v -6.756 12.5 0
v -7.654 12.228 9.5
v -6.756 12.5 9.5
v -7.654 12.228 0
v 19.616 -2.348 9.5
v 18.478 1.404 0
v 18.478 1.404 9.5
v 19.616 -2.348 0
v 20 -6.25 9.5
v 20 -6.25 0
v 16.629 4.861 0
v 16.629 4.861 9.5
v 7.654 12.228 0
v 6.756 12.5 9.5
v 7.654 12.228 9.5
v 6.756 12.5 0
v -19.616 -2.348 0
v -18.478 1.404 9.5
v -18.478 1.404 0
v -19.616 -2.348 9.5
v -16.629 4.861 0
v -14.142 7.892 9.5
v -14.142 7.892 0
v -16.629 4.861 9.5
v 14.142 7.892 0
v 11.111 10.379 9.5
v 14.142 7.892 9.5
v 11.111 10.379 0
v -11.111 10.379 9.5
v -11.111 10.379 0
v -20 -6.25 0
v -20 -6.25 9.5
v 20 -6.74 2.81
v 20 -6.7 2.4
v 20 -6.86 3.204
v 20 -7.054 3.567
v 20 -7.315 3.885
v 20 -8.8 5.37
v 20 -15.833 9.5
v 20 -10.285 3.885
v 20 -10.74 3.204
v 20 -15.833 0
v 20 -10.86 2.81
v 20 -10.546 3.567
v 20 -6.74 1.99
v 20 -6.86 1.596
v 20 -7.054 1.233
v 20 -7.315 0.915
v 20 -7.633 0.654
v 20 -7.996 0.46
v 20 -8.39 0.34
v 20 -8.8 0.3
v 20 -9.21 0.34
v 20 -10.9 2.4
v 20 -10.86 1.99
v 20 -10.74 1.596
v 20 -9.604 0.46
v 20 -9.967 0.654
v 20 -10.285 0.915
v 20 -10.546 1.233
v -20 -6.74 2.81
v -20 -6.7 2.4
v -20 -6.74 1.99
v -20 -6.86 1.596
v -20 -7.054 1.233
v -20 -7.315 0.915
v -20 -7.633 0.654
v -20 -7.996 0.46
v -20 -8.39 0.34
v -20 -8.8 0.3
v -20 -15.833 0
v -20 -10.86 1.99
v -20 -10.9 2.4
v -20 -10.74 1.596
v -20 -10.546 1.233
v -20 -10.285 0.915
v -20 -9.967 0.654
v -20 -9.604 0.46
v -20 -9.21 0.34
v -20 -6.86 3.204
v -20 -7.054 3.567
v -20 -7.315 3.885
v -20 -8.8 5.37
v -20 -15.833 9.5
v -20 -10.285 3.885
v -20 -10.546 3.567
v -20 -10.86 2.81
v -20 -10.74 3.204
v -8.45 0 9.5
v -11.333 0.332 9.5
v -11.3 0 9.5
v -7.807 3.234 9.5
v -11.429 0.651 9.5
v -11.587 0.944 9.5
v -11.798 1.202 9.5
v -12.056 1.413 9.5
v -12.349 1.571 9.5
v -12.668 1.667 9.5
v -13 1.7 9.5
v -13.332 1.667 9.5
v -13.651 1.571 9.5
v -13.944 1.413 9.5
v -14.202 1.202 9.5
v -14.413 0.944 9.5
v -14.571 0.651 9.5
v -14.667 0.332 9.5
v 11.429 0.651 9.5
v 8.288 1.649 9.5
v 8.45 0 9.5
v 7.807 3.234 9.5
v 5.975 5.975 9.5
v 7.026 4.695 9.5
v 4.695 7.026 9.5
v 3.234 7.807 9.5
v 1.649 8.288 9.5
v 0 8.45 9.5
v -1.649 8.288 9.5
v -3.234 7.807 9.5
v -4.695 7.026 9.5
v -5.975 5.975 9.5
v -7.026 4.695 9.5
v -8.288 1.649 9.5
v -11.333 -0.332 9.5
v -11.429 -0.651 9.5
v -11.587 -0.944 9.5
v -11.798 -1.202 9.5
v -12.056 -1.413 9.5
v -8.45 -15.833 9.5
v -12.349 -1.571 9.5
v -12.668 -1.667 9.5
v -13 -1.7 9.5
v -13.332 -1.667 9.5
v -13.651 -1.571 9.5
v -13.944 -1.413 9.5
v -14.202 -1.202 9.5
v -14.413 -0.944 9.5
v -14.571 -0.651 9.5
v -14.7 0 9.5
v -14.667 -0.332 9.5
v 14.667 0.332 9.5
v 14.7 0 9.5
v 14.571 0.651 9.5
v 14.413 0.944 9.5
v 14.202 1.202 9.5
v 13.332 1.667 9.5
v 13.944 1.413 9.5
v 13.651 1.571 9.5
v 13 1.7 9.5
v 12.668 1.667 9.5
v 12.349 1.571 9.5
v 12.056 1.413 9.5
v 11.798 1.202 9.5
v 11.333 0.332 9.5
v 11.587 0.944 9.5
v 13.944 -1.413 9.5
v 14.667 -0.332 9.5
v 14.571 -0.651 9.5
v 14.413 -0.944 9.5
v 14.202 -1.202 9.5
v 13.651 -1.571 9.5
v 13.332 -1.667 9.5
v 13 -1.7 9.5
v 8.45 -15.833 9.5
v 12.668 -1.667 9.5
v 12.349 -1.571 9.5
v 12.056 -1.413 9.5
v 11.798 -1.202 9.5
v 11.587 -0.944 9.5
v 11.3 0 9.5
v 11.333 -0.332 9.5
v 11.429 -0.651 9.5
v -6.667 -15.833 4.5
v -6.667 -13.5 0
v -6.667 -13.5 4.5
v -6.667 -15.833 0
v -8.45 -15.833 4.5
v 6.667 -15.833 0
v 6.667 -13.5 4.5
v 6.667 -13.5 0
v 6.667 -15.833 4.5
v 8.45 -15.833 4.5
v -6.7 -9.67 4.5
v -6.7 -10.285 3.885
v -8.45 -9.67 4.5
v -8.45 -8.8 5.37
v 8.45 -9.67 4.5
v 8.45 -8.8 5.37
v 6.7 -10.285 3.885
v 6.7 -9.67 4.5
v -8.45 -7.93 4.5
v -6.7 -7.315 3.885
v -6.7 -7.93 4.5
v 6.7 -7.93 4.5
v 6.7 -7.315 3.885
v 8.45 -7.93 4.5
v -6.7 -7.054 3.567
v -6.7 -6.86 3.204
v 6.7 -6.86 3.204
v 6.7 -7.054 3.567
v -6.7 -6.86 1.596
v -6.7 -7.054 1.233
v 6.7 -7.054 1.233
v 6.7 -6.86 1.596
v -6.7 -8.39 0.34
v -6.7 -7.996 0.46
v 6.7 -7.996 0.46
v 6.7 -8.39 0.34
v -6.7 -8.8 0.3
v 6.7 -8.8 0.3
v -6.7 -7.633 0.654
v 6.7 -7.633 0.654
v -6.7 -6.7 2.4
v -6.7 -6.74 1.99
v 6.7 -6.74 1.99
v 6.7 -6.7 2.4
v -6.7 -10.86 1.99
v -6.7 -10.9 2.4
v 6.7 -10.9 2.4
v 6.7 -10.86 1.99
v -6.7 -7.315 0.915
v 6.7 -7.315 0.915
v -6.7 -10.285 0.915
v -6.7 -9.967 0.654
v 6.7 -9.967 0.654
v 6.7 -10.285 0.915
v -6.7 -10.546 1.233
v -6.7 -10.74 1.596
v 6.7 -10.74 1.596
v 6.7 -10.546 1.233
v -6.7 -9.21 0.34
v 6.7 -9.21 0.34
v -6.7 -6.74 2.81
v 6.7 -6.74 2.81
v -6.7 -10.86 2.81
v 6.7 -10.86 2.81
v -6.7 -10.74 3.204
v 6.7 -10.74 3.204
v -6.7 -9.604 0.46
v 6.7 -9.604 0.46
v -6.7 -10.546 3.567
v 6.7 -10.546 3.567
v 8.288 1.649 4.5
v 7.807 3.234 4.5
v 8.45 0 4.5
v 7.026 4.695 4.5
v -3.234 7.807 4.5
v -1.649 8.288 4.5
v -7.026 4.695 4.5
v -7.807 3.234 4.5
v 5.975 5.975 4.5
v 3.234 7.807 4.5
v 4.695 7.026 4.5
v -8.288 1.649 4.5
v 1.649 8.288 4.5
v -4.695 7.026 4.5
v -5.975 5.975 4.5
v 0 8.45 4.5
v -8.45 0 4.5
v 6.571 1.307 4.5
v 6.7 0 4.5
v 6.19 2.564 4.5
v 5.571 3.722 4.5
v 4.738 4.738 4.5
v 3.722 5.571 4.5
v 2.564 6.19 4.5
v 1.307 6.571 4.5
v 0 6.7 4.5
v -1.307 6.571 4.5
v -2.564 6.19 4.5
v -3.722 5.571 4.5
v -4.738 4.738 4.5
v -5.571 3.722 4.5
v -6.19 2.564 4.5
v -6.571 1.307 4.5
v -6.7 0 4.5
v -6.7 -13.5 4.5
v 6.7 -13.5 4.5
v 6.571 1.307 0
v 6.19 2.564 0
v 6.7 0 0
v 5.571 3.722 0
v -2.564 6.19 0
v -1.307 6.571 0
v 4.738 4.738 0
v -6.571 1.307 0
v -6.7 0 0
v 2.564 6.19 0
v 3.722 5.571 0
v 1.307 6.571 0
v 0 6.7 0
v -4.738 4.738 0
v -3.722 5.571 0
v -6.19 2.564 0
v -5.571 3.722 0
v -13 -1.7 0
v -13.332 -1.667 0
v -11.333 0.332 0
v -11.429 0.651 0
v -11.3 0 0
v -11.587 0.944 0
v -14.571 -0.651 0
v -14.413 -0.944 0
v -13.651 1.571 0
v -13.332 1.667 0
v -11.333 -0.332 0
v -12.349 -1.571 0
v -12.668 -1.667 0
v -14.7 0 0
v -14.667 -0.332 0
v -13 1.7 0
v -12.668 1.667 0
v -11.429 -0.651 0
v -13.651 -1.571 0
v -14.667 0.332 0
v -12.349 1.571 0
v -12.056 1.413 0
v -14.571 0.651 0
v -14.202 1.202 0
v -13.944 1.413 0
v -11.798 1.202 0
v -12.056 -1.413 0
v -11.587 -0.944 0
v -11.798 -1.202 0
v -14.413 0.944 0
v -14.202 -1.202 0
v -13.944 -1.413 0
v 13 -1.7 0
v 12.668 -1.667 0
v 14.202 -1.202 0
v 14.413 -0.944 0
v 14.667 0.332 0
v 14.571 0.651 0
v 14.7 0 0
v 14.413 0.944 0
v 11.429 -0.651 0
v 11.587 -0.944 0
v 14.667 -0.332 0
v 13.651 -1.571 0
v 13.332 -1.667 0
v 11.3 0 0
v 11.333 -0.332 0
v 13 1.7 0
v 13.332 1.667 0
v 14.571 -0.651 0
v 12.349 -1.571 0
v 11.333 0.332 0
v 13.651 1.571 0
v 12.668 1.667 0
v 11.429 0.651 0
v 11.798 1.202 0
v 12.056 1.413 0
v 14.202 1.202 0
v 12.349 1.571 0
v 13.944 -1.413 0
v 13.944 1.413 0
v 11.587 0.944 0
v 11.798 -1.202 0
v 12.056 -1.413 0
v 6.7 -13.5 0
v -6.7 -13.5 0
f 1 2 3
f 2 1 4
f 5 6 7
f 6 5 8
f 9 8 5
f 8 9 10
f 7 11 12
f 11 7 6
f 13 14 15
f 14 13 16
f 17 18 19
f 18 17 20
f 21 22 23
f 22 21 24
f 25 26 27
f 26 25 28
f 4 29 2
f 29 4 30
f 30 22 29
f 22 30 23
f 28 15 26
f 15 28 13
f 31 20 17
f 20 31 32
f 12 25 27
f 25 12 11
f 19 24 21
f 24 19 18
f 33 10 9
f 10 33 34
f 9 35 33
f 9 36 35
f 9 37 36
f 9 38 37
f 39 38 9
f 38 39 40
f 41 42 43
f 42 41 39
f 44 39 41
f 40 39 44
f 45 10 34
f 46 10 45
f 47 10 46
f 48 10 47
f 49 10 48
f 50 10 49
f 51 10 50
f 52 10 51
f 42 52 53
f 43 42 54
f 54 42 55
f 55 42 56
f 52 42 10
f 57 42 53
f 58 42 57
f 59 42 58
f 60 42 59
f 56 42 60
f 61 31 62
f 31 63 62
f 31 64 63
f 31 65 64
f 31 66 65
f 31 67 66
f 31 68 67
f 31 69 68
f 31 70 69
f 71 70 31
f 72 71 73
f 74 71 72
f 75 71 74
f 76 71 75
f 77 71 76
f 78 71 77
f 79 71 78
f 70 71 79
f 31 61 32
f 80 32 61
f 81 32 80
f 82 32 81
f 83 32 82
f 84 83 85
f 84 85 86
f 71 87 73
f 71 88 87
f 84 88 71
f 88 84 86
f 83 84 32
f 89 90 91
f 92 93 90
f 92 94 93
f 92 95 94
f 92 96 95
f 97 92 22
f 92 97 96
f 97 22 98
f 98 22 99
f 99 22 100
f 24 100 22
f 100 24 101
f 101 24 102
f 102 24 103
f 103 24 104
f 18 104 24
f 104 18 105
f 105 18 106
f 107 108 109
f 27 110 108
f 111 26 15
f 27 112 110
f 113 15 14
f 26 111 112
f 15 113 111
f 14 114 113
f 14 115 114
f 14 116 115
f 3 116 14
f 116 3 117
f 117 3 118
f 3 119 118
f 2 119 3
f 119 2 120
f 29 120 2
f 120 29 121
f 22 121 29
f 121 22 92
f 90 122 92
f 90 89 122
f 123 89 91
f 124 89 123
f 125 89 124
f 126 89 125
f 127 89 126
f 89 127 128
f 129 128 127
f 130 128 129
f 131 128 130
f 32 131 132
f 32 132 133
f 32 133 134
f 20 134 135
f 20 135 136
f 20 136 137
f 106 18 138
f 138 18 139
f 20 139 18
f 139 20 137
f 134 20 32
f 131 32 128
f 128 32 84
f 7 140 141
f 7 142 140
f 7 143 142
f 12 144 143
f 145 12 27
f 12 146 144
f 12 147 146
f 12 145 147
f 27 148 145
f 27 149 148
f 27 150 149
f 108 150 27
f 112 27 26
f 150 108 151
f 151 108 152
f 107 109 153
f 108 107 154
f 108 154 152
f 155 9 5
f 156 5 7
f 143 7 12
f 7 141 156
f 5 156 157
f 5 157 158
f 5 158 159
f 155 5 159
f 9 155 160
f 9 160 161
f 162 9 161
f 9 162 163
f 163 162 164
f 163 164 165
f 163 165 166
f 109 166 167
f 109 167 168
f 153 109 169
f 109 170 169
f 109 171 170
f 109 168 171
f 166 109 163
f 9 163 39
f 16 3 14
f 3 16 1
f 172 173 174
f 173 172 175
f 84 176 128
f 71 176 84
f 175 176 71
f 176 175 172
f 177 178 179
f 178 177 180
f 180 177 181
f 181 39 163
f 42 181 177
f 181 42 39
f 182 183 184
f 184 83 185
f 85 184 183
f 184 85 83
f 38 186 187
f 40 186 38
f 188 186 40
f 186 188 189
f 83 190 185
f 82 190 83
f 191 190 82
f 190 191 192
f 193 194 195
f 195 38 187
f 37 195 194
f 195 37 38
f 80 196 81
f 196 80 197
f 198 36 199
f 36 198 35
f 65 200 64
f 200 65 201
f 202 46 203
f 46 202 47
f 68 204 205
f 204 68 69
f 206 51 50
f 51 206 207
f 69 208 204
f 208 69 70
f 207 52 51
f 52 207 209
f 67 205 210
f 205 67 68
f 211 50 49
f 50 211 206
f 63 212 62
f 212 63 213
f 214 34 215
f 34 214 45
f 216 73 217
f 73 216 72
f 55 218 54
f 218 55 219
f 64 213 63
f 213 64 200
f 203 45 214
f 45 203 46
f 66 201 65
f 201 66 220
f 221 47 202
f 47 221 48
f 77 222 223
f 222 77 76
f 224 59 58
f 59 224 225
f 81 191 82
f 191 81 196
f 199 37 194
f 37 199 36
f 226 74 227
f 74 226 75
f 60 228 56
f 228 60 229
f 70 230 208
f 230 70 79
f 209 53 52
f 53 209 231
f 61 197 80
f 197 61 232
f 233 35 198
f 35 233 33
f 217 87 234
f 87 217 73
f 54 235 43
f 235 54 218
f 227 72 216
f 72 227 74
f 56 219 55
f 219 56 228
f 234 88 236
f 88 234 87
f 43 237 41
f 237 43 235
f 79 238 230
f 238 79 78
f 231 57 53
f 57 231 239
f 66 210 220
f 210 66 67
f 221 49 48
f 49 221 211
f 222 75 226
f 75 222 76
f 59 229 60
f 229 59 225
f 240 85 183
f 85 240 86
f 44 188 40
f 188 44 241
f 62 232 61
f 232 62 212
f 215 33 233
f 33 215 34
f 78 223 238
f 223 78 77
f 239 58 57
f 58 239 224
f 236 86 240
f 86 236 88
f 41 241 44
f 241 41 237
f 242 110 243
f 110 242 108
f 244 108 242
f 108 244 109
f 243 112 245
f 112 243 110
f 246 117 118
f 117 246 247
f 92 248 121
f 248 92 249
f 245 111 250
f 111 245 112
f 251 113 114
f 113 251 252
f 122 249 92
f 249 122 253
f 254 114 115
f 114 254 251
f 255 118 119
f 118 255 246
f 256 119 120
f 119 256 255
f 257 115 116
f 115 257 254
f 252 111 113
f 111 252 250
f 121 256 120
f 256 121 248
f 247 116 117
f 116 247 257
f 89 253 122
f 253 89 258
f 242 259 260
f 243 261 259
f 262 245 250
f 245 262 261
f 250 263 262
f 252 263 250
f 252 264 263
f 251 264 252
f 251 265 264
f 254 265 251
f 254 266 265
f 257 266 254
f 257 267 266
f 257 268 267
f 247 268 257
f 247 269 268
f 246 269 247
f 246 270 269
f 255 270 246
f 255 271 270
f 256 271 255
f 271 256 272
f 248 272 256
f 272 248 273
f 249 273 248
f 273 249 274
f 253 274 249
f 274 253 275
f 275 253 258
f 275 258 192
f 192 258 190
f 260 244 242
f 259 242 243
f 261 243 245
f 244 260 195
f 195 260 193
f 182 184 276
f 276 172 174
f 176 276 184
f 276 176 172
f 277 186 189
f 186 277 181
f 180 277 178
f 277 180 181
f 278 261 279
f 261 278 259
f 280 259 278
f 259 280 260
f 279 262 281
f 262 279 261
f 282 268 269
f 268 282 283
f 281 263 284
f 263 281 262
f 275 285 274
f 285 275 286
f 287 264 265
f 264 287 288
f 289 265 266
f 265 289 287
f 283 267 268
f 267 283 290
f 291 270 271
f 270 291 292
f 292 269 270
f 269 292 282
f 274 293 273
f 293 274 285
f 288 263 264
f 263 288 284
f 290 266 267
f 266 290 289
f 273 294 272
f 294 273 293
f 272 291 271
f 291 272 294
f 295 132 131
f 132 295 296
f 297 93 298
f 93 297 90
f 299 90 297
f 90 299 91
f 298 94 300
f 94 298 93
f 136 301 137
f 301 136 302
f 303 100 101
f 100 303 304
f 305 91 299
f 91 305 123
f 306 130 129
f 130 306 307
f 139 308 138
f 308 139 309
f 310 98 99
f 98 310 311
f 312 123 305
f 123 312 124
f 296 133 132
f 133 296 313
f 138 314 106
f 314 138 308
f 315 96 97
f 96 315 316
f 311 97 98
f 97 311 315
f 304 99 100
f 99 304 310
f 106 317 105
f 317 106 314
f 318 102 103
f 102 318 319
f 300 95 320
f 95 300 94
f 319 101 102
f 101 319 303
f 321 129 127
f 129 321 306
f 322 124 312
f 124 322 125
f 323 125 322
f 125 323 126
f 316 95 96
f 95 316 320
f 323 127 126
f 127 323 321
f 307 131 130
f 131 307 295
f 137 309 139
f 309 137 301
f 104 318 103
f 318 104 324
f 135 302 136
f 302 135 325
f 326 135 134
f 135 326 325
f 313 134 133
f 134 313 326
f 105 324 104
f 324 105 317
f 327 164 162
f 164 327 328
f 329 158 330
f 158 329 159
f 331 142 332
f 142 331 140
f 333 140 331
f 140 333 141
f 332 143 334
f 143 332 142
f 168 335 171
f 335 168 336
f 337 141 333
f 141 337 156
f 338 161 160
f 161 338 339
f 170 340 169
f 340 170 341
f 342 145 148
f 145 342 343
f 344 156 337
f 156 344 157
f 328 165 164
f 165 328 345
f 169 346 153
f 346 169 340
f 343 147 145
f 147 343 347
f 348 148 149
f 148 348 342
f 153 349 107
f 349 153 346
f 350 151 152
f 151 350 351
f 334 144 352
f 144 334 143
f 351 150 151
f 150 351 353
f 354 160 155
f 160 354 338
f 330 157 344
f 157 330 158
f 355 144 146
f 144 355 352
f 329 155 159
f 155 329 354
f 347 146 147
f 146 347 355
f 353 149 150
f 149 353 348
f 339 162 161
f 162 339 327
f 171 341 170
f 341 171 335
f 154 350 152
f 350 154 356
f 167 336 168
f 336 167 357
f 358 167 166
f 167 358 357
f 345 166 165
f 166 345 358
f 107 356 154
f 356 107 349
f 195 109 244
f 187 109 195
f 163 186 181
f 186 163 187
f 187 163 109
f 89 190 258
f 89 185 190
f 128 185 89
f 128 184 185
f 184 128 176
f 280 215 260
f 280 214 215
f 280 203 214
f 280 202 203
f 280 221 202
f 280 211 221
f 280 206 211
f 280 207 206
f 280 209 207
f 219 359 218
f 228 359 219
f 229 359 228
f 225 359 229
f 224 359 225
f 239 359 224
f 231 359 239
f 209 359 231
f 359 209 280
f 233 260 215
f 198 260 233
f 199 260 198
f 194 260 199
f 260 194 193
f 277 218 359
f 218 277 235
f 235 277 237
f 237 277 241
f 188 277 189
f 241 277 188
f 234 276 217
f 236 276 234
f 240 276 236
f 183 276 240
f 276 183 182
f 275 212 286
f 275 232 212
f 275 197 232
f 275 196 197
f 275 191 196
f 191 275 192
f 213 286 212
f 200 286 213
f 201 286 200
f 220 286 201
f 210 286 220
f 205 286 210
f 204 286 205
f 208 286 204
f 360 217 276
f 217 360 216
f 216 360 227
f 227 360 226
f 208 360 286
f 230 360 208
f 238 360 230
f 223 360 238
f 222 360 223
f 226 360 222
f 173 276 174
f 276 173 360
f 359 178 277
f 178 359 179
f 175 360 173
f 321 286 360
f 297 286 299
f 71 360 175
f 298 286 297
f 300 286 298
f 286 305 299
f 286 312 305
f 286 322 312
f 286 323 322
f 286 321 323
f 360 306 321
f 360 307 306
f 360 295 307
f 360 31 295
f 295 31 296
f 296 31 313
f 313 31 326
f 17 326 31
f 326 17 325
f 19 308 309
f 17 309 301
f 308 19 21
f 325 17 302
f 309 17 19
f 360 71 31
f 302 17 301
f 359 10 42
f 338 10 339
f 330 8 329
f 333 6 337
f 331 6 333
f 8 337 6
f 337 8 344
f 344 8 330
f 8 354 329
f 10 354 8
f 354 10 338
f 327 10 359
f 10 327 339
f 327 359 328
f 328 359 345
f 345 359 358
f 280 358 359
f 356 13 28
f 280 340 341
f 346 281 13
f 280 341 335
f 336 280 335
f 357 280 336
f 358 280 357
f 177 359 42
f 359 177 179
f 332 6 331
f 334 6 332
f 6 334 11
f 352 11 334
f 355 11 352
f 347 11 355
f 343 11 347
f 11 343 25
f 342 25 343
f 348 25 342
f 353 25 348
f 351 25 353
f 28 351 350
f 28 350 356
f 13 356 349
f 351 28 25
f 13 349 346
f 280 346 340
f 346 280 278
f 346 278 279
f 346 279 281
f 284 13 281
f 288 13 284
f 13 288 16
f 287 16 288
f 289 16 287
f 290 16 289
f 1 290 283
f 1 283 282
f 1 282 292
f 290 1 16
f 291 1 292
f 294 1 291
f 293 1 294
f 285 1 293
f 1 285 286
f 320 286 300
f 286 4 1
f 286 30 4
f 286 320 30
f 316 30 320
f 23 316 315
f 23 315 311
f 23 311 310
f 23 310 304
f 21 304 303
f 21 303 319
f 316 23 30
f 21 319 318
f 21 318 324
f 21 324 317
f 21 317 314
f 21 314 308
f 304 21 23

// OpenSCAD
// Grooved Insulator Mount Adapter #3
// by Tony Buser <tbuser@gmail.com>
// uses teardrop module by Erik de Bruijn <info@erikdebruijn.nl>
// GPLv2 or later

// actually about 16, set slightly larger if printer isn't perfect
barrel_diameter = 16.9;

// actually about 13, set slightly larger if printer isn't perfect
barrel_inset_diameter = 13.4;

// how long?
plate_length = 40;

// how wide?
plate_width = 25;

// probably don't want to change this
plate_height = 10;

// mounting bolts will need to be 15mm long?
mounting_bolt_diameter = 3.4;

// for standard plastruder = 13 for printruder II = 14
left_mounting_bolt_distance = 13;

// for standard plastruder = 13 for printruder II = 11
right_mounting_bolt_distance = 13;

// single horizontal bolt to clamp and hold insulator in place. will need to be around 45mm long?
clamp_bolt_diameter = 4.2;

$fn = 32;

module teardrop(radius,height,truncated) {
	truncateMM = 1;
	union() {
		if (truncated == true) {
			intersection() {
				translate([0,0,height/2]) scale([1,1,height]) rotate([0,0,180]) cube([radius*2.5,radius*2,1],center=true);
				scale([1,1,height]) rotate([0,0,3*45]) cube([radius,radius,1]);
			}
		}
		if (truncated == false) {
			scale([1,1,height]) rotate([0,0,3*45]) cube([radius,radius,1]);
		}
		cylinder(r=radius, h = height);
	}
}

module plate() {
	difference() {
		union() {
			cube([plate_length, plate_width, plate_height]);

			// mounting bolt reinforcement
			translate([0, -plate_width/3+5, 0]) {
				cube([plate_length/3, plate_width/3-5, plate_height]);
			}

			translate([plate_length-plate_length/3, -plate_width/3+5, 0]) {
				cube([plate_length/3, plate_width/3-5, plate_height]);
			}
		}

		// barrel top
		translate([plate_length/2, plate_width/2, plate_height/2]) {
			cylinder(r=barrel_diameter/2, h=plate_height/2+1);
		}

		// barrel inset
		translate([plate_length/2, plate_width/2, -1]) {
			cylinder(r=barrel_inset_diameter/2, h=plate_height/2+2);
		}

		// mounting bolt left hole
		translate([plate_length/2-left_mounting_bolt_distance, plate_width/2, -1]) {
			cylinder(r=mounting_bolt_diameter/2, h=plate_height+2);
		}

		// mounting bolt right hole
		translate([plate_length/2+right_mounting_bolt_distance, plate_width/2, -1]) {
			cylinder(r=mounting_bolt_diameter/2, h=plate_height+2);
		}

		/*
		// mounting bolt head space left
		translate([plate_length/2-14, plate_width/2, -1]) {
			cylinder(r=mounting_bolt_head_diameter/2, h=plate_height/2+1);
		}

		// mounting bolt head space right
		translate([plate_length/2+11, plate_width/2, -1]) {
			cylinder(r=mounting_bolt_head_diameter/2, h=plate_height/2+1);
		}
		*/

		// clamp bolt		
		translate([-1, plate_width/2-barrel_inset_diameter/2-clamp_bolt_diameter/2, plate_height/2-clamp_bolt_diameter/2]) {
			rotate([0, 90, 0]) {
				teardrop(clamp_bolt_diameter/2, plate_length+2, false);
			}
		}
	}
}

module cutout() {
	intersection() {
		// carve a curve around the border
		union() {
			translate([plate_length/2, plate_width/2/2, -1]) {
				cylinder(r=plate_length/2, h=plate_height+2);
			}
			translate([0, -plate_width/2/2-plate_width/2, -1]) {		
				cube([plate_length, plate_width, plate_height+2]);
			}
		}

		difference() {
			plate();

			// top cutout
			translate([plate_length/2-barrel_diameter/2, -10, plate_height/2]) {
				cube([barrel_diameter, plate_width/2+10, plate_height/2+1]);
			}

			// bottom cutout
			translate([plate_length/2-barrel_inset_diameter/2, -1, -1]) {
				cube([barrel_inset_diameter, plate_width/2+1, plate_height/2+2]);
			}

			// remove 0.5mm from bottom to make it slide on easier
			translate([-5,-5,-1]) {
				cube([plate_length+10, plate_width+10, 1.5]);
			}
		}
	}
}

module print() {	
	// center and orient it to print correctly
	translate([-plate_length/2, -plate_width/2, -0.5]) cutout();
}

//plate();
//cutout();
//reinforcement();
print();
